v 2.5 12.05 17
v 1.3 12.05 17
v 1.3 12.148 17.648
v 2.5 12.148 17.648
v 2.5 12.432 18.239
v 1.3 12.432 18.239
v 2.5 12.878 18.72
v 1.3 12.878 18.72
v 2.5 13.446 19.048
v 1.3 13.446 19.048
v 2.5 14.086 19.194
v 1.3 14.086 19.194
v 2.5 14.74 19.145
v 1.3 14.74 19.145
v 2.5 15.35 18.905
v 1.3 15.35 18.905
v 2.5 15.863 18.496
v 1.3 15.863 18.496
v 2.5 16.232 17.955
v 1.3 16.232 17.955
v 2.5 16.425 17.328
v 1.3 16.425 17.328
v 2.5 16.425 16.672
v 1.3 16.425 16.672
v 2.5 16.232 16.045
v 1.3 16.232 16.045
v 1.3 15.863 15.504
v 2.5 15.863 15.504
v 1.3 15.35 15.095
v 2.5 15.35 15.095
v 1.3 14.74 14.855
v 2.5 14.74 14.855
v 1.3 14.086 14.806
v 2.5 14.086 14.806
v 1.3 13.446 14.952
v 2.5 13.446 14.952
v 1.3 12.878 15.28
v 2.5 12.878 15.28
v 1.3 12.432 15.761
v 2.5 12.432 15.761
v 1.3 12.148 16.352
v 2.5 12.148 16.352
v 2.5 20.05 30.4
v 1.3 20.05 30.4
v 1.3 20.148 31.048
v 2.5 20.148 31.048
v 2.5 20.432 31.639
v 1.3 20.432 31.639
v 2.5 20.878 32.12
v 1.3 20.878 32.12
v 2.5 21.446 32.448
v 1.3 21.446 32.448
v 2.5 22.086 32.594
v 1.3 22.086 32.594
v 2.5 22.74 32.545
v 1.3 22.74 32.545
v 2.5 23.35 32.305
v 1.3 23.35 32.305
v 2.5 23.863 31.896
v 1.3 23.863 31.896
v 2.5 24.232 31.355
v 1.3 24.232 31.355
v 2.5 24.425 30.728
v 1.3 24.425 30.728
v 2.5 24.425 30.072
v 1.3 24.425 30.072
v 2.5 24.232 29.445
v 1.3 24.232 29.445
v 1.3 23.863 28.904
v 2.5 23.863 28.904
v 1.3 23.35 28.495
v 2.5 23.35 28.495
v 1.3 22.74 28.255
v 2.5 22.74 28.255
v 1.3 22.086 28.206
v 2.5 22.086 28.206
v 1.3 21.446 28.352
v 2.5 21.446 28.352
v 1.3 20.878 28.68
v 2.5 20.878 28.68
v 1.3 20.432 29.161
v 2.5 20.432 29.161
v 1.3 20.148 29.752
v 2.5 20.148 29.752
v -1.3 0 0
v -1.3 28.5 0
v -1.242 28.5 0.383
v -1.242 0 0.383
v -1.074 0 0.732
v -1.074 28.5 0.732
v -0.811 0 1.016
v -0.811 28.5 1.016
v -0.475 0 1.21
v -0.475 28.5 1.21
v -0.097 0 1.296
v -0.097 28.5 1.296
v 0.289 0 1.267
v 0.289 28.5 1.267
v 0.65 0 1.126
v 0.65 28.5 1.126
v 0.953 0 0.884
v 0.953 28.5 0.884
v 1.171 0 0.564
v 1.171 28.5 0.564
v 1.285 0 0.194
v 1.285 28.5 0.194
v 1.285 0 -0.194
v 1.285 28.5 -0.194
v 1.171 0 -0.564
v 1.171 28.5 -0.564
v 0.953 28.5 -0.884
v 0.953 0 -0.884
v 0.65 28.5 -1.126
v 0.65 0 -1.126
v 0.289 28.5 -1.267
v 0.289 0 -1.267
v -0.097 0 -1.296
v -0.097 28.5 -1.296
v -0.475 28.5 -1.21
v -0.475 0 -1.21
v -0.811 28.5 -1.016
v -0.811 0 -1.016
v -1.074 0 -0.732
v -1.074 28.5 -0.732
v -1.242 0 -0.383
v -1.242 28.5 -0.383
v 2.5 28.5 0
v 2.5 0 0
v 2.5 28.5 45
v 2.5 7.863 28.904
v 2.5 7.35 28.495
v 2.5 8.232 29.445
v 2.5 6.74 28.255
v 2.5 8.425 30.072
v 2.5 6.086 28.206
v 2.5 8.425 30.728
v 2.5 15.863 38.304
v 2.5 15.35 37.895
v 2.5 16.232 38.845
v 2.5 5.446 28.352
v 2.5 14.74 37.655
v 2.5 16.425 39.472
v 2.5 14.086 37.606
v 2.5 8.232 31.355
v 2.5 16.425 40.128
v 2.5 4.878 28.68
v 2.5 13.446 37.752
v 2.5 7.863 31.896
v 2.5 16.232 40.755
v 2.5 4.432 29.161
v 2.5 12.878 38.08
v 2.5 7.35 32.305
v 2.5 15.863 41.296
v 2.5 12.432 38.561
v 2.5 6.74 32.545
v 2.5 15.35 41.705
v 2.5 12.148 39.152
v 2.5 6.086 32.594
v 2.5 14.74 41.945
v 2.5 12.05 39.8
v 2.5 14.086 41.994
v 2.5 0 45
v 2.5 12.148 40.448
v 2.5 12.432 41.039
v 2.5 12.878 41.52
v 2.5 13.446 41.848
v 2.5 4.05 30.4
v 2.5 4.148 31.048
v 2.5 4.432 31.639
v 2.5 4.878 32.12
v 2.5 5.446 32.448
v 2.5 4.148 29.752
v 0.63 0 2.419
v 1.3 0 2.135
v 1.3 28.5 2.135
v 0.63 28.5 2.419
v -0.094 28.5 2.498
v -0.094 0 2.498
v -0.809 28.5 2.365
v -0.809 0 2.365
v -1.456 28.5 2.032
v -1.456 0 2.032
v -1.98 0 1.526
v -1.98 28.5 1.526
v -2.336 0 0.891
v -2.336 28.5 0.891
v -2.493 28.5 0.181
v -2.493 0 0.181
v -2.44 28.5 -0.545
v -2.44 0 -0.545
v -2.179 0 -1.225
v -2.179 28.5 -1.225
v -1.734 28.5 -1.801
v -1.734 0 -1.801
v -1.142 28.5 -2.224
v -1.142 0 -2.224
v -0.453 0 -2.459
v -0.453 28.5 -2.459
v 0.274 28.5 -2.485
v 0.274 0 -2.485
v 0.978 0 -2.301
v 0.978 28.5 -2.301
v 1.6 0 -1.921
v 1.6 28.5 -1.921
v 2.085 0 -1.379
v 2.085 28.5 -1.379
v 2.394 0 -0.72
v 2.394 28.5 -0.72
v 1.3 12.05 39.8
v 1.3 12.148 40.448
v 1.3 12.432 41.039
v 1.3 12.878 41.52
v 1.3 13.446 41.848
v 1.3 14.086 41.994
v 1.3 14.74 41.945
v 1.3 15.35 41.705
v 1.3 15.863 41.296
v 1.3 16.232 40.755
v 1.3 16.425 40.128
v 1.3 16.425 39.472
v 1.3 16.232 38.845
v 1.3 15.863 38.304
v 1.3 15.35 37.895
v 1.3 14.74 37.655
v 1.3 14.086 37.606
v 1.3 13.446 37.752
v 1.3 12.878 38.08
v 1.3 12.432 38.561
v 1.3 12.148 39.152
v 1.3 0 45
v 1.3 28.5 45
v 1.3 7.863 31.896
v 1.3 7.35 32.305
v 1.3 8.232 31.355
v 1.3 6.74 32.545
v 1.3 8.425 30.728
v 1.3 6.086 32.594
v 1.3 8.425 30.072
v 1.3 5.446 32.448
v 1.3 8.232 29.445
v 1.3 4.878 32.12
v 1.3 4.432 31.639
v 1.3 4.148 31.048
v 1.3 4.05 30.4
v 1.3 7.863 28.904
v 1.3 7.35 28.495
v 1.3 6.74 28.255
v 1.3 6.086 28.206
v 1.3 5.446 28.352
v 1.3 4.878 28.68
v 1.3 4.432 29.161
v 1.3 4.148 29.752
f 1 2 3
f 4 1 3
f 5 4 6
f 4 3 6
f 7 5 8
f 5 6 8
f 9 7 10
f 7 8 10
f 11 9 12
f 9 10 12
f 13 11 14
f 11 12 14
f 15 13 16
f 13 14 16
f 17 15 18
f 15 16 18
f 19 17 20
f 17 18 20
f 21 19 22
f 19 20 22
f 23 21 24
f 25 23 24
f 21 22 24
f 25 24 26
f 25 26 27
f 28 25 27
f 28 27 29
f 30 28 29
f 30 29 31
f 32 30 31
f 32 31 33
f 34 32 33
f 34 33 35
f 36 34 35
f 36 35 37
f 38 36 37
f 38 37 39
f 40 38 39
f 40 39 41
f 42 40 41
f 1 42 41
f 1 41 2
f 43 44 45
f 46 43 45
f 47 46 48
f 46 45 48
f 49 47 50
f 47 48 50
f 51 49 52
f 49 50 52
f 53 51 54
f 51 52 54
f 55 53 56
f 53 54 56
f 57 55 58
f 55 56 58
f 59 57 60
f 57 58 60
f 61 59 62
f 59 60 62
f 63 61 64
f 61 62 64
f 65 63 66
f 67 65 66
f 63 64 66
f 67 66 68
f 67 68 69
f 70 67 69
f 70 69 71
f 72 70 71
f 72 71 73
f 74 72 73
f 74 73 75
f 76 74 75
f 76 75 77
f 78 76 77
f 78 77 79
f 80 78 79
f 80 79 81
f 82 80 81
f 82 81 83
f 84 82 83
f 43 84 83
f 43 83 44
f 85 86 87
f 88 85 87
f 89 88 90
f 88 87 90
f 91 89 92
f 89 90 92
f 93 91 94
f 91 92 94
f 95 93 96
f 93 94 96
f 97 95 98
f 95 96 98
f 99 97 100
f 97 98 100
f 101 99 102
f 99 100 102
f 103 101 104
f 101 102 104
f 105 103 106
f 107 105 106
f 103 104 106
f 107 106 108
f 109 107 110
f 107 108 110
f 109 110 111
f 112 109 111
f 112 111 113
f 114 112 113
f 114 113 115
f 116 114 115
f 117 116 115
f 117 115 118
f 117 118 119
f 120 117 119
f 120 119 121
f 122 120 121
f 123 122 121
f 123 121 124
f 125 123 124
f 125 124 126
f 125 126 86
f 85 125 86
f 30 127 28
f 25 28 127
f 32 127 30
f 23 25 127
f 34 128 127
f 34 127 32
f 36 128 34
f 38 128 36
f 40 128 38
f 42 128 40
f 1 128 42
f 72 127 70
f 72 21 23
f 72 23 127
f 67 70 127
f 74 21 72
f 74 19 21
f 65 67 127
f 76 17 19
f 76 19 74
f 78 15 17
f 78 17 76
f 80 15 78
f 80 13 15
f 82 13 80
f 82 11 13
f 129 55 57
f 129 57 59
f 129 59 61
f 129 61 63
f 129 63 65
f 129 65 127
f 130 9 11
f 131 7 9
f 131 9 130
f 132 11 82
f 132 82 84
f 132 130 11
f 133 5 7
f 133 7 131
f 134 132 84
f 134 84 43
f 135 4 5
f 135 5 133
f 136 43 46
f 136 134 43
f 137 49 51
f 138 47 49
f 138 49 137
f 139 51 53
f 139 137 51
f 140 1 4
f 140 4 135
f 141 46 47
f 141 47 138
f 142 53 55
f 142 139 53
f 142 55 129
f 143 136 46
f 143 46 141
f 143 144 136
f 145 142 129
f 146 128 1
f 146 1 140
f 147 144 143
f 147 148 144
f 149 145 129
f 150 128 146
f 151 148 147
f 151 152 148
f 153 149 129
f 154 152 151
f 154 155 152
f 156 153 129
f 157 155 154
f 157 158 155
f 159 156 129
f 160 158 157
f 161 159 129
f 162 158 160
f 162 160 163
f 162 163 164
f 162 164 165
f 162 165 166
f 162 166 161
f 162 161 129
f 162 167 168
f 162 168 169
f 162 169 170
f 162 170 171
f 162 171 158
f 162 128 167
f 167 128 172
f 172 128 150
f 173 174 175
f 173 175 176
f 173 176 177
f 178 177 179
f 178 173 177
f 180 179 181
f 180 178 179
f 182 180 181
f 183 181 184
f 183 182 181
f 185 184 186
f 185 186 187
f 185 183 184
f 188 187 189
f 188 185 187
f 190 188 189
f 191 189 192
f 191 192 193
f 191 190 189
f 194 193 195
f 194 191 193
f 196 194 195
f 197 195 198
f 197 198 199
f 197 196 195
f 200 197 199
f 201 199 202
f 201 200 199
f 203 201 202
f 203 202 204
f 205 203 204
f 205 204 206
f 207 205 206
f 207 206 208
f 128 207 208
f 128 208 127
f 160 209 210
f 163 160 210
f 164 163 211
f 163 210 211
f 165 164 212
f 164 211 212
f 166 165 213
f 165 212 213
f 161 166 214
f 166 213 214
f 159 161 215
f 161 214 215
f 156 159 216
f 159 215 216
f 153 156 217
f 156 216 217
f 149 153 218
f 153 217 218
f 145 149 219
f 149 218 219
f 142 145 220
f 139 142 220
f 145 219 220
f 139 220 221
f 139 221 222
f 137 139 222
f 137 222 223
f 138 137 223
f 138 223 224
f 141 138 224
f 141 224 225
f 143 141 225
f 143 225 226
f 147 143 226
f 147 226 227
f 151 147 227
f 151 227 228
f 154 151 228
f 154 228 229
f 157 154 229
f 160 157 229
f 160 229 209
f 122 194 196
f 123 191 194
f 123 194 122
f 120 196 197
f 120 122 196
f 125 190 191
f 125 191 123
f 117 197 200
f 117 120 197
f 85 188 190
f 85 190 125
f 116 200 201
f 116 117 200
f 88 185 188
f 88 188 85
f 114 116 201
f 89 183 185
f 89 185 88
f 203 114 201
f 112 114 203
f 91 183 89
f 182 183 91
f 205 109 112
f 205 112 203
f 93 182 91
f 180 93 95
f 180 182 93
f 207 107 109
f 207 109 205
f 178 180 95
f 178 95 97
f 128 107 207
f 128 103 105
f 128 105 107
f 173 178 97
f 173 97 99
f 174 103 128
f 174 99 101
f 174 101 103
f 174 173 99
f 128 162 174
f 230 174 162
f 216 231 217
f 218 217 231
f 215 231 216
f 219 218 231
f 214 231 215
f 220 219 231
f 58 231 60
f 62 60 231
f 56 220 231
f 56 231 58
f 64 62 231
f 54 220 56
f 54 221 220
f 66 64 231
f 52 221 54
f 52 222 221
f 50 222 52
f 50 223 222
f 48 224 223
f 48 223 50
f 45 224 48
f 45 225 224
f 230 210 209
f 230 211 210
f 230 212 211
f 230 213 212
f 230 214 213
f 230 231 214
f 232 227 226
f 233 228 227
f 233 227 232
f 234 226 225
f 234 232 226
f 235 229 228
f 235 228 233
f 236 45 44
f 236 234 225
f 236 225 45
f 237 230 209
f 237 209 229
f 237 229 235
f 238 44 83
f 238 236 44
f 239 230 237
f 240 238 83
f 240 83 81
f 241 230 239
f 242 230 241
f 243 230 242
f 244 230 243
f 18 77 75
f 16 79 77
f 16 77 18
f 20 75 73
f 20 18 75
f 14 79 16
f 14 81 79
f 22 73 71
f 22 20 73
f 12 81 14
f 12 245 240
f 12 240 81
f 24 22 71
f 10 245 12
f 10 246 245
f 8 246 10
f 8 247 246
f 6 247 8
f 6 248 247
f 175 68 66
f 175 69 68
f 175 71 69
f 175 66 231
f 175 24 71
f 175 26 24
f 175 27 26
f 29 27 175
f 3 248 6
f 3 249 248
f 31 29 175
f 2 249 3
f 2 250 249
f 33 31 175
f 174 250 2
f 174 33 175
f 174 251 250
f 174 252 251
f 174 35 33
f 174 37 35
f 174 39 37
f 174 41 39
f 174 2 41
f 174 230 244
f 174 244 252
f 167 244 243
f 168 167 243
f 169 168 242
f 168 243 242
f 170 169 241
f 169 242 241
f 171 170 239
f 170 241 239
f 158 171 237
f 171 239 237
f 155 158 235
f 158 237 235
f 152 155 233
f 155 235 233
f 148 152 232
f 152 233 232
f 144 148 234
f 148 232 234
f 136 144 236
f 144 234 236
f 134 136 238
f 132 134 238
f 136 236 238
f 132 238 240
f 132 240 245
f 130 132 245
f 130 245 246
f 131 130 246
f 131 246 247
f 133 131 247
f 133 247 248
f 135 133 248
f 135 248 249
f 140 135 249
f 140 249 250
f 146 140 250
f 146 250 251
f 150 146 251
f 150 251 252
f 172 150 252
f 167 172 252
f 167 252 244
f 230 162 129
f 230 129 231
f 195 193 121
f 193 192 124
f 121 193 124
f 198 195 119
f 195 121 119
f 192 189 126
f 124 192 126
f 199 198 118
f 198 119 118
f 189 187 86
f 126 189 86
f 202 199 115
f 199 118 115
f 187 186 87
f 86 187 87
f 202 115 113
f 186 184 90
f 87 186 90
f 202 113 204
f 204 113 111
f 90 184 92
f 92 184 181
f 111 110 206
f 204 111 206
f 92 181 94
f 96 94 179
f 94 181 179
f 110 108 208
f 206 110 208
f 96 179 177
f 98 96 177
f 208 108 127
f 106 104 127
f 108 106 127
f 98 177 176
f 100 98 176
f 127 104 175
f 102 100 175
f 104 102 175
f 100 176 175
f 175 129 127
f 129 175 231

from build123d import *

# Parameters (mm, degrees)
F1_DEPTH = 28.5
F2_D     = 2.6
F4_D     = 4.4


with BuildPart() as f1:
    # F0 (on Front) → F1 (new body)
    with BuildSketch(Plane.XZ):
        with BuildLine():
            ThreePointArc((1.3, 2.1354156504), (2.1794494718, 1.2247448714), (2.5, 0))
            Line((2.5, 0), (2.5, 45))
            Line((2.5, 45), (1.3, 45))
            Line((1.3, 45), (1.3, 2.1354156504))
        make_face()
        with BuildLine():
            ThreePointArc((1.3, 2.1354156504), (-2.1794494718, -1.2247448714), (2.5, 0))
            ThreePointArc((2.5, 0), (2.1794494718, 1.2247448714), (1.3, 2.1354156504))
        make_face()
    extrude(amount=-F1_DEPTH)

    # F2 (through all)
    with Locations(Plane.XZ):
        with Locations((0, 0)):
            Hole(F2_D / 2)

    # F4 (through all)
    with Locations(Plane.YZ.offset(2.5)):
        with Locations((14.25, 39.8), (22.25, 30.4), (6.25, 30.4), (14.25, 17)):
            Hole(F4_D / 2)


solid = f1.part
